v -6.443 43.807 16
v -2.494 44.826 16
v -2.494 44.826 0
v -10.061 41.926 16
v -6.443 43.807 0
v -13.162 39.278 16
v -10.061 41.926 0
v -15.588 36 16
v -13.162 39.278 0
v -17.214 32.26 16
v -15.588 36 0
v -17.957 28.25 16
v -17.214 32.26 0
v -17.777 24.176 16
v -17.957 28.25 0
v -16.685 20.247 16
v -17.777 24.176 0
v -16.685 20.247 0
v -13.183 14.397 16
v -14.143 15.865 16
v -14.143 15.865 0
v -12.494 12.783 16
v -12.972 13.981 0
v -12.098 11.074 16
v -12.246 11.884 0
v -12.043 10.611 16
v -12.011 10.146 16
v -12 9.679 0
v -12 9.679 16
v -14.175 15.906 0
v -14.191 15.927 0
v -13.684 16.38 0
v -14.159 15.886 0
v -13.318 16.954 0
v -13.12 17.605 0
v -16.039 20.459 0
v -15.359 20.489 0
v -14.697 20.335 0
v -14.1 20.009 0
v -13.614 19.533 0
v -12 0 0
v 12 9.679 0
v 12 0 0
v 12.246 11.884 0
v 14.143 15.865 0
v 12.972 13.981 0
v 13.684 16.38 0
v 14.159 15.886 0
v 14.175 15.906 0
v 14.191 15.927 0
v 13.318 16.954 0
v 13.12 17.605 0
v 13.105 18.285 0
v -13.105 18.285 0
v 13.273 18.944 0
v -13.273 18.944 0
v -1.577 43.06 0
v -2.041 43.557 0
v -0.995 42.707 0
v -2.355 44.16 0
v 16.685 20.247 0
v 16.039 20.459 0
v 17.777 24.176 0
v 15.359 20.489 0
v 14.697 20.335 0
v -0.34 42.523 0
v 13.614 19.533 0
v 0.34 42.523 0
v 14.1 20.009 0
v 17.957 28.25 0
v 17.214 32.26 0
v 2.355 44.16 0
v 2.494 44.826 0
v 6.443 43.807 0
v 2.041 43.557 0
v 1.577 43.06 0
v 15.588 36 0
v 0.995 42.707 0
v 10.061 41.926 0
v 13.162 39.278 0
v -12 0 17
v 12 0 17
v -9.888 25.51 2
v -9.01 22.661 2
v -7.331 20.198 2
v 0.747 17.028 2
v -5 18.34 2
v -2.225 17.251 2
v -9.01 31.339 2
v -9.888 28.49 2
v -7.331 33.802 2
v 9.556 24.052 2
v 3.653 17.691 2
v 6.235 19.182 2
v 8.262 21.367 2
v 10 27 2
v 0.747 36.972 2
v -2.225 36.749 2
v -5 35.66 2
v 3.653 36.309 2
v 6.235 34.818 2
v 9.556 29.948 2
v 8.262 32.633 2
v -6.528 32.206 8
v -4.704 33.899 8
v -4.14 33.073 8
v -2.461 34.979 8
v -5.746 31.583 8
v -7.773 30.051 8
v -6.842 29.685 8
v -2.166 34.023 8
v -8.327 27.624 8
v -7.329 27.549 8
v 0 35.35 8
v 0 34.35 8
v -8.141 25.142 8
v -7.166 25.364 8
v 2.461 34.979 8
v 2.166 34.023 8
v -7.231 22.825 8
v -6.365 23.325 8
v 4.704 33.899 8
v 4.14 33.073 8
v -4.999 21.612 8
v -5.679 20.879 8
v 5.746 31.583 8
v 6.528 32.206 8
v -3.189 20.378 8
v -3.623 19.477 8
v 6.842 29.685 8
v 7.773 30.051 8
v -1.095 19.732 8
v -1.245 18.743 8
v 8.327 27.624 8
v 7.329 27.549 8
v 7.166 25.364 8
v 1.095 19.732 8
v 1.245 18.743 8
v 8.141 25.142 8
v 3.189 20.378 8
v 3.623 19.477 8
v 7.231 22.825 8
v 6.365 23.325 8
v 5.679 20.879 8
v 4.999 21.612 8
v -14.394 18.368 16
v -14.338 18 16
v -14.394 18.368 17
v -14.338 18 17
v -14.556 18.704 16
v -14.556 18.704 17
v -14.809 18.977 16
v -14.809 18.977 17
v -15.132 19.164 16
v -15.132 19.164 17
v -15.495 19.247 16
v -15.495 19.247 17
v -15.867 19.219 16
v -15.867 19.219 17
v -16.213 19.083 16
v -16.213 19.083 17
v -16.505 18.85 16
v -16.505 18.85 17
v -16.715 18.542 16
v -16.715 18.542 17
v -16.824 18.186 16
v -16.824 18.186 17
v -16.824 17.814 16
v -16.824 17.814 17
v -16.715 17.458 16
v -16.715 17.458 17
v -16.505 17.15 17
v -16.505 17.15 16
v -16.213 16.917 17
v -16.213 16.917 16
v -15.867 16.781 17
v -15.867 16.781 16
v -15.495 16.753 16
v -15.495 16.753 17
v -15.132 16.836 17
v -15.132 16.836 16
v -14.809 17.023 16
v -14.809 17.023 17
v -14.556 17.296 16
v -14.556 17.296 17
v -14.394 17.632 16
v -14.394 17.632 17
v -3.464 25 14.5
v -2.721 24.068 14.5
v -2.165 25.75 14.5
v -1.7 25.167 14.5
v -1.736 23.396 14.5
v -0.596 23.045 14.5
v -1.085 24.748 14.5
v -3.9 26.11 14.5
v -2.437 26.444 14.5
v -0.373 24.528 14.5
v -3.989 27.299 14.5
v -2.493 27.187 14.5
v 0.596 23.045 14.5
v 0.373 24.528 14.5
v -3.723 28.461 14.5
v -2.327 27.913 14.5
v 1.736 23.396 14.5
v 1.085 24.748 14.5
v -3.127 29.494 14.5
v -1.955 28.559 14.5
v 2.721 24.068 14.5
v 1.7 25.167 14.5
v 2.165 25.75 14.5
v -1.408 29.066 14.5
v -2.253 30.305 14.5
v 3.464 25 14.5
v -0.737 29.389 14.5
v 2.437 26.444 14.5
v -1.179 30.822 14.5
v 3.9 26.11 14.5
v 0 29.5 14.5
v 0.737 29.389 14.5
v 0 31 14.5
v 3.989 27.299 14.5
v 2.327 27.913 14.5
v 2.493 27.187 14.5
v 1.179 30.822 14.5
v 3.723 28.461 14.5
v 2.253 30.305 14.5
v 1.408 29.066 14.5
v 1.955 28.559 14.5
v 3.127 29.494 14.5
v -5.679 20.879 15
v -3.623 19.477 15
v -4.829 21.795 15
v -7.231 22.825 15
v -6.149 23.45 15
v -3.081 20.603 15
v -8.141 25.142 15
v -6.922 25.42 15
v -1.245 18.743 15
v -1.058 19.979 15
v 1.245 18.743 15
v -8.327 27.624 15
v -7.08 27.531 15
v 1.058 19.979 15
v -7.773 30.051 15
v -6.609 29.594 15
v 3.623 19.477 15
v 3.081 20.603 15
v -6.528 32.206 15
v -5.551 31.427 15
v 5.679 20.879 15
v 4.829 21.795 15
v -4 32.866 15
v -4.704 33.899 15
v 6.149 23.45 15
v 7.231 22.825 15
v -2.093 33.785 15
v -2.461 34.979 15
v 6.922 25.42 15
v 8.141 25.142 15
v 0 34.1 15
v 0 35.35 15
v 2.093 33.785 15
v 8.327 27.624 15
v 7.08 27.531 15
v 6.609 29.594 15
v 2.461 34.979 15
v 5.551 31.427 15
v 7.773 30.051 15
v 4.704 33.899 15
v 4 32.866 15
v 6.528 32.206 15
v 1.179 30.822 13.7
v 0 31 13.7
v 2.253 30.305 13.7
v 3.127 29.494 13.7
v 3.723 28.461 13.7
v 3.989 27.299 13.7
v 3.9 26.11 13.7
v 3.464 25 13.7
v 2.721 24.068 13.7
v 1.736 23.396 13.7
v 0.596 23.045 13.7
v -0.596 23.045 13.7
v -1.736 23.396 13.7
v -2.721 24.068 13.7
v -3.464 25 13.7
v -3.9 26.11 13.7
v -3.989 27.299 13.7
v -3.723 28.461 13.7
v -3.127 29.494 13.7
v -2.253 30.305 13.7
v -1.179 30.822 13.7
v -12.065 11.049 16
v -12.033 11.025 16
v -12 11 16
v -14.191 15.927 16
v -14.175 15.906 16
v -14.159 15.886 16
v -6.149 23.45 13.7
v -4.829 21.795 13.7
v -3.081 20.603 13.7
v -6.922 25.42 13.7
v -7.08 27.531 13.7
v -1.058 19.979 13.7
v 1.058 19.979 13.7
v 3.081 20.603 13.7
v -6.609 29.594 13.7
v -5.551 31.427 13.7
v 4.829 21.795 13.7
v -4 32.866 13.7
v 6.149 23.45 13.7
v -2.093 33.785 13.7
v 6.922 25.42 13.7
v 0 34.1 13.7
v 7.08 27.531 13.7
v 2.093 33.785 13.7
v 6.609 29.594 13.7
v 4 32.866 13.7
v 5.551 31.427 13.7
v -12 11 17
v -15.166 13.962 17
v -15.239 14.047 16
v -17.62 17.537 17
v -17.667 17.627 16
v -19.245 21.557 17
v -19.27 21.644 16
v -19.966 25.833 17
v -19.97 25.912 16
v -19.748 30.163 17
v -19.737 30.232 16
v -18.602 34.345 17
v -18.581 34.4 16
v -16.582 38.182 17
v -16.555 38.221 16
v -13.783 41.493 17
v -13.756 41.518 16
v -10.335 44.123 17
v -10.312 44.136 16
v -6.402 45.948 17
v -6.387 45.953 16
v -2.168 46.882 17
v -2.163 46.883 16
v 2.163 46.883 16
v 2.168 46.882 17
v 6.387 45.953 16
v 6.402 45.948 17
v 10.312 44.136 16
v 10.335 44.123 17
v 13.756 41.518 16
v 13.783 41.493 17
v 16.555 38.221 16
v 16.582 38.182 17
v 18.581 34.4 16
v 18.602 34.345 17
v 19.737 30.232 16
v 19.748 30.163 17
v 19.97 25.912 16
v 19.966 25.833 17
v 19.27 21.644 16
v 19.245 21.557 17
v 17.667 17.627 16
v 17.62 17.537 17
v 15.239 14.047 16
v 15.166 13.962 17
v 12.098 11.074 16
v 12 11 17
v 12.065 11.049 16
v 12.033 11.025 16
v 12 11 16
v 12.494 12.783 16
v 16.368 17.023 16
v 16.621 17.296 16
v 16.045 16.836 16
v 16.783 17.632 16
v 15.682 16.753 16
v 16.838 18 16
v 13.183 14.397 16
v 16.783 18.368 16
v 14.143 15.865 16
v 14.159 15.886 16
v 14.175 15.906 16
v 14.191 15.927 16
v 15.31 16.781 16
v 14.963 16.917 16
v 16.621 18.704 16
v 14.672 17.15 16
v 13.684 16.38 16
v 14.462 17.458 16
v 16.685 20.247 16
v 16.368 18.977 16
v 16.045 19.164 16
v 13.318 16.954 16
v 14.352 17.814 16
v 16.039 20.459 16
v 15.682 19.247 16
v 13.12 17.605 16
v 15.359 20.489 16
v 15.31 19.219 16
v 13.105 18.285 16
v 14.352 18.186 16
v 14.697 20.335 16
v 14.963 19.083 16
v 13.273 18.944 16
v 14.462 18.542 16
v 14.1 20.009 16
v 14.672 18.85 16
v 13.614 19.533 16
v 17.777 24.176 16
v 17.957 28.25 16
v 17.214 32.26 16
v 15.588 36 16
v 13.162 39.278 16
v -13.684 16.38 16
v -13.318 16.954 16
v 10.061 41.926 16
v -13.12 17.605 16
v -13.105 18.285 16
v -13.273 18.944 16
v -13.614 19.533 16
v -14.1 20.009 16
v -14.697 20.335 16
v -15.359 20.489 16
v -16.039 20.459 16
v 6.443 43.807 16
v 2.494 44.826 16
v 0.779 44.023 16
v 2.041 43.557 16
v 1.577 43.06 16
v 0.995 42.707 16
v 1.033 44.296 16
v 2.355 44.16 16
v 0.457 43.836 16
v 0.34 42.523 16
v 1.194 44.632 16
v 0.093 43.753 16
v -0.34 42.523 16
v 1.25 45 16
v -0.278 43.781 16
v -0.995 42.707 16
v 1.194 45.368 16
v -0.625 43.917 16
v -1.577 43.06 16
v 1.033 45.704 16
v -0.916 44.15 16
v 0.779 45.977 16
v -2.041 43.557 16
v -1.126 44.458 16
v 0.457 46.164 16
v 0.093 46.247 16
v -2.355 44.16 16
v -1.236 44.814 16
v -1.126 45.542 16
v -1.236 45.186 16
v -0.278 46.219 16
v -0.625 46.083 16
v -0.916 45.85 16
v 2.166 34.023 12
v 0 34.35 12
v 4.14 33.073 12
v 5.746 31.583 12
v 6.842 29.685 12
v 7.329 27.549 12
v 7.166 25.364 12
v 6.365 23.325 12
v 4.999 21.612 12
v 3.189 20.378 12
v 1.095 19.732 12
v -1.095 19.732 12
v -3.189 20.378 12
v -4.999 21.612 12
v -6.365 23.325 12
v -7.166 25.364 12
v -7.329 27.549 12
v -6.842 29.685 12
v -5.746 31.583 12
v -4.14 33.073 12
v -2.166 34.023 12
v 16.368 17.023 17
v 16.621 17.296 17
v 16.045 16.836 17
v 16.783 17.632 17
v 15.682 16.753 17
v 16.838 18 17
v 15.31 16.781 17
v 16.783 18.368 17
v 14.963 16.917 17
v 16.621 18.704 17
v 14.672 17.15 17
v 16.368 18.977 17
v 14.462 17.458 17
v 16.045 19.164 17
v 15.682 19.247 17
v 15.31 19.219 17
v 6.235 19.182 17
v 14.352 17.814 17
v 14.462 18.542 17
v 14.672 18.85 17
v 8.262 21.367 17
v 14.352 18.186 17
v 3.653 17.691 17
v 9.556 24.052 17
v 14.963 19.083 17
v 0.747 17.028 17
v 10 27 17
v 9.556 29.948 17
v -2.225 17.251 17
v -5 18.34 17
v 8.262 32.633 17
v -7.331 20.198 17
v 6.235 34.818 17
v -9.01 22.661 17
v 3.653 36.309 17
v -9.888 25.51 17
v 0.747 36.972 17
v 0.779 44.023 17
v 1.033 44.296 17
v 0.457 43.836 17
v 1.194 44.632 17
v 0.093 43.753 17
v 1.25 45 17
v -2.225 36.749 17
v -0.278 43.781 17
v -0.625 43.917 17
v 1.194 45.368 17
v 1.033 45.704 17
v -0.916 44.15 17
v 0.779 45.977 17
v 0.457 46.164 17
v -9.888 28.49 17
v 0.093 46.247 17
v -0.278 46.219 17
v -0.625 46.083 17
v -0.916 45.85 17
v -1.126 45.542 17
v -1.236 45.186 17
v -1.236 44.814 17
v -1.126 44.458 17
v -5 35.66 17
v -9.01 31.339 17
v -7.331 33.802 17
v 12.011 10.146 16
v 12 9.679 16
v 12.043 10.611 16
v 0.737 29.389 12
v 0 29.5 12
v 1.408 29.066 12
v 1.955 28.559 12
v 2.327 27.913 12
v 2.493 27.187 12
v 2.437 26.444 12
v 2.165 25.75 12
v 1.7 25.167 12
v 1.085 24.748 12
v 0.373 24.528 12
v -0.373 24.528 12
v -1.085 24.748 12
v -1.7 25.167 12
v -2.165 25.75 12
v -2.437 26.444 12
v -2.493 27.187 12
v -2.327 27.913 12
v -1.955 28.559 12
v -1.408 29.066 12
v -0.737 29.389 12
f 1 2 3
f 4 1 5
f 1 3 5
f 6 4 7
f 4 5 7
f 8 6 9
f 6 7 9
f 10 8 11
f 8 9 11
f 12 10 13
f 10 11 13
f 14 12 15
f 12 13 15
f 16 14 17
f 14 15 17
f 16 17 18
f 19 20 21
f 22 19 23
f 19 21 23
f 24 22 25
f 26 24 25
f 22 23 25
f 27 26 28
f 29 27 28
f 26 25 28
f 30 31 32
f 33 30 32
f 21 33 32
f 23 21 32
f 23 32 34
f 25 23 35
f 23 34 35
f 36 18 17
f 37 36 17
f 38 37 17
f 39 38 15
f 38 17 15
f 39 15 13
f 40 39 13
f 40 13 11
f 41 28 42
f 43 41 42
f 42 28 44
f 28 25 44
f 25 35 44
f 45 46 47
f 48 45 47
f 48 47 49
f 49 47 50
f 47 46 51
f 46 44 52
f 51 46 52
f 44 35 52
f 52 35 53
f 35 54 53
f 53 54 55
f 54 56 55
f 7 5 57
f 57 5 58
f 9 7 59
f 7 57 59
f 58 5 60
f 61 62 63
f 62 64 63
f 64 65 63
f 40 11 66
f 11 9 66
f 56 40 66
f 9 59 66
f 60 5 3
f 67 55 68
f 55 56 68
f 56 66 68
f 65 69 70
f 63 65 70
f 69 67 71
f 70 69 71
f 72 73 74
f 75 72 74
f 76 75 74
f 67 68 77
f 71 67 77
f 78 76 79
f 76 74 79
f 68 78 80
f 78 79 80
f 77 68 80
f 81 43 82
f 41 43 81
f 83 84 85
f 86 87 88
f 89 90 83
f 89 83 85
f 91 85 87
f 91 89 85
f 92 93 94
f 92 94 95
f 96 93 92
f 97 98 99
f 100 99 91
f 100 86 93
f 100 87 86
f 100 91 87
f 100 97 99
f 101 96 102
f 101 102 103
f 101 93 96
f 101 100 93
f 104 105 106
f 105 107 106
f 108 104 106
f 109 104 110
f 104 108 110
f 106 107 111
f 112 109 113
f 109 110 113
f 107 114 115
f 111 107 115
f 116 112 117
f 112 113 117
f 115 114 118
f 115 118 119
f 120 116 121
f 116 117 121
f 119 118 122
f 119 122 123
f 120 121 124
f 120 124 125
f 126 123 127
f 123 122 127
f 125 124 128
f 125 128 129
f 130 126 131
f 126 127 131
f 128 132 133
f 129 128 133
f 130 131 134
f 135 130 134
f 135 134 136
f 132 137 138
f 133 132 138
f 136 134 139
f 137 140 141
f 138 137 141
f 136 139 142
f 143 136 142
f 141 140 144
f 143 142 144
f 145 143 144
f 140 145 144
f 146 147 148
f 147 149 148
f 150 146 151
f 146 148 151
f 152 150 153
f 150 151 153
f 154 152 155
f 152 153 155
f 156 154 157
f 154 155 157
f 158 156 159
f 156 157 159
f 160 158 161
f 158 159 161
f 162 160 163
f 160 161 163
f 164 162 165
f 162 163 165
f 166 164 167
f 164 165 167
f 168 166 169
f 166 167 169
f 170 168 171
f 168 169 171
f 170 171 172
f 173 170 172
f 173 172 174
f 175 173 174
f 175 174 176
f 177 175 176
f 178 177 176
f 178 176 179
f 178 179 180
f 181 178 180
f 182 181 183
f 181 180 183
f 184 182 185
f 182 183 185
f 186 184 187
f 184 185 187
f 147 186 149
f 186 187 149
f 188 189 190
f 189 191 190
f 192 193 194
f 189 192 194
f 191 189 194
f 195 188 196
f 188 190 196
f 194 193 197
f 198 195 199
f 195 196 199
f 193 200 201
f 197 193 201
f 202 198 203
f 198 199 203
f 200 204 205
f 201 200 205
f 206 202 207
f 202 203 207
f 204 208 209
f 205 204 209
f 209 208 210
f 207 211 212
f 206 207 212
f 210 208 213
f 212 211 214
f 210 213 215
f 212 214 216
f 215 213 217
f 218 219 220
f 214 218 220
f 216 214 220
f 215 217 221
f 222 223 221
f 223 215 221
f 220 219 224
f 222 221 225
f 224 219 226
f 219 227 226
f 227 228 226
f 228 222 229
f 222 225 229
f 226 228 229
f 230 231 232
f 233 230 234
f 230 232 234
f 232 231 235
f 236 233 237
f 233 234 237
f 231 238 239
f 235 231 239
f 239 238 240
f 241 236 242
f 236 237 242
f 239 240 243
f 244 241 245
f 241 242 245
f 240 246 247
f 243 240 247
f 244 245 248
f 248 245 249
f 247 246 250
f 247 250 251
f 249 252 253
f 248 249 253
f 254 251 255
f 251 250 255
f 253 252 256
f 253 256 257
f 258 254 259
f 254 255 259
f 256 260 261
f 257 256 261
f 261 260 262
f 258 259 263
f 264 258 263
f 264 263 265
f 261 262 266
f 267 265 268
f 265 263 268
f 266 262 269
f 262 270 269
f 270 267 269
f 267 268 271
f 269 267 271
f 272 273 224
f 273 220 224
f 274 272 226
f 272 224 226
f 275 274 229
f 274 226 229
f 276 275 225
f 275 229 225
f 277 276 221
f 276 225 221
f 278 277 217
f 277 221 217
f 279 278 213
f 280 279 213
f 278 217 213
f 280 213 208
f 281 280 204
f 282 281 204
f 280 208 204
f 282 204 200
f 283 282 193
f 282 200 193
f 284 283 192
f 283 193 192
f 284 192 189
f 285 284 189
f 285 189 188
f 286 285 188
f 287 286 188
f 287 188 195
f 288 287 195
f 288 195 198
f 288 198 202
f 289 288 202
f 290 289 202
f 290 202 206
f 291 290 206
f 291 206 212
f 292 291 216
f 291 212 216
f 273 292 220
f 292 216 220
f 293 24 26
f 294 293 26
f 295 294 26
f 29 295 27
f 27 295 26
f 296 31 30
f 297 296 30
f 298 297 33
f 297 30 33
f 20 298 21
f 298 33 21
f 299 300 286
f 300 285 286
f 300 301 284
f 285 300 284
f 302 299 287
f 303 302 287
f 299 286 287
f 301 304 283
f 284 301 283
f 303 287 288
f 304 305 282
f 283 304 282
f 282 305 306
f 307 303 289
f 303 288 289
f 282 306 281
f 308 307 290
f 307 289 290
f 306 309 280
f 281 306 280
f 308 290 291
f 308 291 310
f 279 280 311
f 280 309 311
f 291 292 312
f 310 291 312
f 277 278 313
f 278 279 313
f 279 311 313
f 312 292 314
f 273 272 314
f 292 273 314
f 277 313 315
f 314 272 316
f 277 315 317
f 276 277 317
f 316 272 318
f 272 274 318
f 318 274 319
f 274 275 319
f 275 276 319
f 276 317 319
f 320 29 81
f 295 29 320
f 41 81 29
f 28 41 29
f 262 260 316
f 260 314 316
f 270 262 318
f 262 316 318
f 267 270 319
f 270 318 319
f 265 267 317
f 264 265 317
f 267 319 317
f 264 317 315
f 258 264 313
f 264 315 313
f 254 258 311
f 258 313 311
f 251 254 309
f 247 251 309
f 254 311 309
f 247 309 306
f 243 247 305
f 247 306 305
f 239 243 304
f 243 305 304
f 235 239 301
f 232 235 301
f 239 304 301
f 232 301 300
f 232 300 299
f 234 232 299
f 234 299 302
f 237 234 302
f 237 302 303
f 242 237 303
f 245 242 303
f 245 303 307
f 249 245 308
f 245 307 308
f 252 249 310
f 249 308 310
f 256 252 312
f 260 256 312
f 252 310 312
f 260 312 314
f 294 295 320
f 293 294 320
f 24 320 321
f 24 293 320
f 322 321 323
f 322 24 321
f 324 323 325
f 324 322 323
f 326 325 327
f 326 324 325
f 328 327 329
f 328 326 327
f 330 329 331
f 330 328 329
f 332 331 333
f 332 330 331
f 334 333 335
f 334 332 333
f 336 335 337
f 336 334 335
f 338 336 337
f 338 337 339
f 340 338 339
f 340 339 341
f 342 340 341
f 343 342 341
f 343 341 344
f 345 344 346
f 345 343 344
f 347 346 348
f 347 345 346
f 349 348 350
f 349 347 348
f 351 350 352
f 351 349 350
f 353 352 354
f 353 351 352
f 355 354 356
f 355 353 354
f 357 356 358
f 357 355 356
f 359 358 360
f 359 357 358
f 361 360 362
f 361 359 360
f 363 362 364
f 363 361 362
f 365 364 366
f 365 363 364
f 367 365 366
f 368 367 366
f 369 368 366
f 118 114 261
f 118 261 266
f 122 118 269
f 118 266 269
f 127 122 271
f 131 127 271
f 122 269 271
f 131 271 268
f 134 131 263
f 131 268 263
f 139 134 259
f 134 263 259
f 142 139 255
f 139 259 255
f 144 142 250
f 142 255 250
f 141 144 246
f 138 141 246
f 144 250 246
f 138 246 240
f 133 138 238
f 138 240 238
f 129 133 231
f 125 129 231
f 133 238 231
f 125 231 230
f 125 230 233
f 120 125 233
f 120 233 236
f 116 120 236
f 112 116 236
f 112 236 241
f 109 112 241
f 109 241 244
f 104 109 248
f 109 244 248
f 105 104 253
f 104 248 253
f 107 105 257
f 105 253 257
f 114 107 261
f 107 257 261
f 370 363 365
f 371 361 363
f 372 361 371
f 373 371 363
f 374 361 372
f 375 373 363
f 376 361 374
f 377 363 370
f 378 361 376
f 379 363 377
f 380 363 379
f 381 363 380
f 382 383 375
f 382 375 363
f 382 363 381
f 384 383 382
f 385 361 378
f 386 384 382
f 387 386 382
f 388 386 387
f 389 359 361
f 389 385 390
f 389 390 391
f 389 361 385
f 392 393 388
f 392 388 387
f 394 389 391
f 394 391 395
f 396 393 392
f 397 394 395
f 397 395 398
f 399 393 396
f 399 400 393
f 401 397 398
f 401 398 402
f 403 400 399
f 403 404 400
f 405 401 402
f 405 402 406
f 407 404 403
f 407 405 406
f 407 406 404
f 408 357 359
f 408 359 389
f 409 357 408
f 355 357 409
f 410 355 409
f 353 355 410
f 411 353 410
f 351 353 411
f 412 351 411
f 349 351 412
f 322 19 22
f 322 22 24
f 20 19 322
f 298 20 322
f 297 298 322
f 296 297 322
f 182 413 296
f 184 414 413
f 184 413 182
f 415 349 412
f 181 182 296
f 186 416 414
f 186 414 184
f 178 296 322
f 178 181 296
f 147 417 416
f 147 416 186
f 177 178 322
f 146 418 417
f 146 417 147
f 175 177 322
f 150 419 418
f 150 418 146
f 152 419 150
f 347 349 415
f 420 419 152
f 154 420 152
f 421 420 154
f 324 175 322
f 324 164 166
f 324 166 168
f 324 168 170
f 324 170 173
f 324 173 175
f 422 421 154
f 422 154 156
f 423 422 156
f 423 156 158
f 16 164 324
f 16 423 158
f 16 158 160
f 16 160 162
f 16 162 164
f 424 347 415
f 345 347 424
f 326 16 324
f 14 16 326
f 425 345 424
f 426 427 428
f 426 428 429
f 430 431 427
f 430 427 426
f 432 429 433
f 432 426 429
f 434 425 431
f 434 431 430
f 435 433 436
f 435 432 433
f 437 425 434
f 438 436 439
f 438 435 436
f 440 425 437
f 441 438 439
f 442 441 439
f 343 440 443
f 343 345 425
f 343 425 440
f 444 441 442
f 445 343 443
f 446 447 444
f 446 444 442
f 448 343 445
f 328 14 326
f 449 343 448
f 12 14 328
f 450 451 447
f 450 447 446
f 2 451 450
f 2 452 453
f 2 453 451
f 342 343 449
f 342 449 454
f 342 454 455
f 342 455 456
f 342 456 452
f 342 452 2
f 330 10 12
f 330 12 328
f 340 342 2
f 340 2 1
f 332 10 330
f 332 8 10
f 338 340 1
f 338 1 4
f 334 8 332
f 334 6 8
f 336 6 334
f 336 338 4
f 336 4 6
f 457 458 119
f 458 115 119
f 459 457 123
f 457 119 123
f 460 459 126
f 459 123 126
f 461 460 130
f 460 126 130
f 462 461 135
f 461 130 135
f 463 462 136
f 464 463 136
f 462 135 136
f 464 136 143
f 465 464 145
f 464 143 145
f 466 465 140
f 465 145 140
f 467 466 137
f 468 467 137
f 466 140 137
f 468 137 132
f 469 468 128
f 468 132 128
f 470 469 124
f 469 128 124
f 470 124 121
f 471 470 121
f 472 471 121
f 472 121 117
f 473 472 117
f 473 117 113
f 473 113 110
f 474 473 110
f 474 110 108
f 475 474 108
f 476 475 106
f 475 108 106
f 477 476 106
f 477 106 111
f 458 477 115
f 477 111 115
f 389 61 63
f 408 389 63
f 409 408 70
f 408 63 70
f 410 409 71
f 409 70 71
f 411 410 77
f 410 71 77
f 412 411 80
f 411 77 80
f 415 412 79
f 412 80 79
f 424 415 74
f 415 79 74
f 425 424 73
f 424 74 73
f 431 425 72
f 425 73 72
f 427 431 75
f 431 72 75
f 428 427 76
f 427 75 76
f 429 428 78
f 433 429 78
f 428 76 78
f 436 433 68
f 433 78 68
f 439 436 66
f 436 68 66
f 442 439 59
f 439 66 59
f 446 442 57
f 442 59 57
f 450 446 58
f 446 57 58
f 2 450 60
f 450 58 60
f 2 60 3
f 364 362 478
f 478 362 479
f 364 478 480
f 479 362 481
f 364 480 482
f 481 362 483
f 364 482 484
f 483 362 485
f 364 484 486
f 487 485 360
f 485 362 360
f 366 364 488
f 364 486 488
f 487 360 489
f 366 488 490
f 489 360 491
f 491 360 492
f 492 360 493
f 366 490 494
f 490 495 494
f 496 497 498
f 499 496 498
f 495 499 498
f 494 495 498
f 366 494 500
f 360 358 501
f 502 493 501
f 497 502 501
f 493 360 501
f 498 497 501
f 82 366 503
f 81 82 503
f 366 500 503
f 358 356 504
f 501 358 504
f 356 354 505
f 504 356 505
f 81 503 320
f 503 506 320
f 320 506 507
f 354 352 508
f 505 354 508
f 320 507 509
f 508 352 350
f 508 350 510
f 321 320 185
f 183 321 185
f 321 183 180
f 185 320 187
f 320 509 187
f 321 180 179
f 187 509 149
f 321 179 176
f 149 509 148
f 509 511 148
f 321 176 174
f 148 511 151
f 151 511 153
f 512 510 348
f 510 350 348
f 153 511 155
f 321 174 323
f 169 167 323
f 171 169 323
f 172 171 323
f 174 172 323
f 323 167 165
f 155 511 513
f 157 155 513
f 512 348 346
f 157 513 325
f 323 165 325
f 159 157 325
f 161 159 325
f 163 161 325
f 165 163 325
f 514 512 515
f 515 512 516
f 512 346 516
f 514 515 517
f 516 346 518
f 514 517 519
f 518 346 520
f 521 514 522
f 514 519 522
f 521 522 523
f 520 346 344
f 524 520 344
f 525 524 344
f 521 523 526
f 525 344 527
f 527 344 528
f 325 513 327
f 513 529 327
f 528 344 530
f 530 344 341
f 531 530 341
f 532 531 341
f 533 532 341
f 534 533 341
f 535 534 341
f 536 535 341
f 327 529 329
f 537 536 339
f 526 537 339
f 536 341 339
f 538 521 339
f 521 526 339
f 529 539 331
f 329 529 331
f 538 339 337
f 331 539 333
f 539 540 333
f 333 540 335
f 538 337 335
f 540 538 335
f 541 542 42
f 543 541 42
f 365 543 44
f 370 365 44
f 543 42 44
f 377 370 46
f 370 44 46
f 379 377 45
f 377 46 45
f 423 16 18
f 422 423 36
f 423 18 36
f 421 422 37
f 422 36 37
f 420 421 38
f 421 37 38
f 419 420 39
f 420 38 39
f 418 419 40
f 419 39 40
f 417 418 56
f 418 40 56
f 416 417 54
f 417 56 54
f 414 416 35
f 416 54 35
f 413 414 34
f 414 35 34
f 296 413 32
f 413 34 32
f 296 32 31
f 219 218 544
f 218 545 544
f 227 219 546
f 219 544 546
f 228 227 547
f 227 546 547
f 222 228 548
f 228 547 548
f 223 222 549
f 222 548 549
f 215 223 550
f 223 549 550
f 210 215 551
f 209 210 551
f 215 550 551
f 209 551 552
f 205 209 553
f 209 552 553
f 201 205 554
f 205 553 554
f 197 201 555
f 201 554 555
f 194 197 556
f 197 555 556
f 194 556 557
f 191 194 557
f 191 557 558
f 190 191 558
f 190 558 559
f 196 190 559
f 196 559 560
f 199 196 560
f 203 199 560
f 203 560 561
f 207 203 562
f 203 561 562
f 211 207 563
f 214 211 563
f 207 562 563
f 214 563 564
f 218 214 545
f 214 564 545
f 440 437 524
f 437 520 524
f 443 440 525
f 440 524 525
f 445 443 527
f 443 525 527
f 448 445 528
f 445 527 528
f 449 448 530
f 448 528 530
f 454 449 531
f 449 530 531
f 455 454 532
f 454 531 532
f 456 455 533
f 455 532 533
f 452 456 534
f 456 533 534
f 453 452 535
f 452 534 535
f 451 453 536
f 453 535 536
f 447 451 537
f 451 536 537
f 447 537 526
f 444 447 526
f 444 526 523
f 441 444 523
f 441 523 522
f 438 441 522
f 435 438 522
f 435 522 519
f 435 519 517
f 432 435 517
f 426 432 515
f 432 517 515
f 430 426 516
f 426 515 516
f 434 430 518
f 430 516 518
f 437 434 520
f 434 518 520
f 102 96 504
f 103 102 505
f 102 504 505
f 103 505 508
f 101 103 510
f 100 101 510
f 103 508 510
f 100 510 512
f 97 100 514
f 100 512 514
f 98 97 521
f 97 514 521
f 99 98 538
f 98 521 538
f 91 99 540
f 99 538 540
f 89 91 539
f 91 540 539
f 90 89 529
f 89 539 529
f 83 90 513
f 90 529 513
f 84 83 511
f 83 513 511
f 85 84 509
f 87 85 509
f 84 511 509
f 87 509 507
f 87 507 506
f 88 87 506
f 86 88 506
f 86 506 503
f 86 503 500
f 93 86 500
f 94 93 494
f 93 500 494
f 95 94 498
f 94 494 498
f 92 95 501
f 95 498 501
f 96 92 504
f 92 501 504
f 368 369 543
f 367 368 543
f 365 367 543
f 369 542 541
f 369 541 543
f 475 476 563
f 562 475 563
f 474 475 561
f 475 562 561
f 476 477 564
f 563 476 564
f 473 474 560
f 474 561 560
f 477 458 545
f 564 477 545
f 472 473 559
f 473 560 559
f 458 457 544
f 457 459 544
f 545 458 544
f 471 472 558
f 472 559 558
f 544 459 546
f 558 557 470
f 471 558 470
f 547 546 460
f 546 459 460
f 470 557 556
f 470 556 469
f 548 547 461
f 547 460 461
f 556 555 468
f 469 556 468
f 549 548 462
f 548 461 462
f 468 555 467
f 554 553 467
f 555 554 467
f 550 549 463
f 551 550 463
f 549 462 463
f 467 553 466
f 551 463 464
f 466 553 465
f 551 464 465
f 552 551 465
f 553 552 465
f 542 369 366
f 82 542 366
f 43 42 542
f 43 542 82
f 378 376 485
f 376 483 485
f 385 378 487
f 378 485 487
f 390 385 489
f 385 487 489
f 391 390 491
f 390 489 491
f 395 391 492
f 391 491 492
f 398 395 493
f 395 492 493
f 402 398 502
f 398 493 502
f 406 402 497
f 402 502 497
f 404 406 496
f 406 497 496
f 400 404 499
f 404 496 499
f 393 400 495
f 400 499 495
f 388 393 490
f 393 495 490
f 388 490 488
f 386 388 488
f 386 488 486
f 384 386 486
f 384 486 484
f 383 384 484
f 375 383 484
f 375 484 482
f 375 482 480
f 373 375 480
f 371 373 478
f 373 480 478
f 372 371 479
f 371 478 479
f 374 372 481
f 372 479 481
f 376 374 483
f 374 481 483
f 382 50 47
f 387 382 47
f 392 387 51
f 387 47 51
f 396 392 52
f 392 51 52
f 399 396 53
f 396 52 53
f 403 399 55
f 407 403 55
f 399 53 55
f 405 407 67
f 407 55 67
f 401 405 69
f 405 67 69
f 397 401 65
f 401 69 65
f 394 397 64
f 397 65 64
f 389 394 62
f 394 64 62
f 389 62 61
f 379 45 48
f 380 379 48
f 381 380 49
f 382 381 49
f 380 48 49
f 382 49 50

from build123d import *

# Parameters (mm, degrees)
EXTRUDE1_DEPTH                   = 16
EXTRUDE2_DEPTH                   = 1
CBORE_FOR_M2_5_SHCS1_D           = 2.5
CBORE_FOR_M2_5_SHCS1_CBORE_D     = 5
CBORE_FOR_M2_5_SHCS1_CBORE_DEPTH = 16
SKETCH6_R                        = 10
CUT_EXTRUDE1_DEPTH               = 15


with BuildPart() as part:
    # Sketch1 → Extrude1 (new body)
    with BuildSketch(Plane.XY):
        with BuildLine():
            Line((-12, 0), (12, 0))
            Line((12, 0), (12, 9.679491924))
            ThreePointArc((12, 9.679491924), (12.550888175, 12.952760278), (14.142857143, 15.865387666))
            ThreePointArc((14.142857143, 15.865387666), (0, 45), (-14.142857143, 15.865387666))
            ThreePointArc((-14.142857143, 15.865387666), (-12.550888175, 12.952760278), (-12, 9.679491924))
            Line((-12, 9.679491924), (-12, 0))
        make_face()
    extrude(amount=EXTRUDE1_DEPTH)

    # Sketch2 → Extrude2 (add)
    with BuildSketch(Plane.XY.offset(16)):
        with BuildLine():
            Line((12, 11), (12, 0))
            Line((12, 0), (-12, 0))
            Line((-12, 0), (-12, 11))
            ThreePointArc((-12, 11), (0, 47), (12, 11))
        make_face()
    extrude(amount=EXTRUDE2_DEPTH)

    # CBORE for M2.5 SHCS1 (through all)
    with Locations(Plane(origin=(0, 0, 0), x_dir=(-1, 0, 0), z_dir=(0, 0, -1))):
        with Locations((0, 45), (15.588457268, 18), (-15.588457268, 18)):
            CounterBoreHole(CBORE_FOR_M2_5_SHCS1_D / 2, CBORE_FOR_M2_5_SHCS1_CBORE_D / 2, CBORE_FOR_M2_5_SHCS1_CBORE_DEPTH)

    # Sketch6 → Cut-Extrude1 (cut)
    with BuildSketch(Plane.XY.offset(17)):
        with Locations((0, 27)):
            Circle(SKETCH6_R)
    extrude(amount=-CUT_EXTRUDE1_DEPTH, mode=Mode.SUBTRACT)


with BuildPart() as body_2:
    # Sketch7 → Revolve1 (revolve)
    with BuildSketch(Plane(origin=(0, 0, 0), x_dir=(0, 0, -1), z_dir=(1, 0, 0))):
        Polygon((-8, 34.35), (-8, 35.35), (-15, 35.35), (-15, 34.1), (-13.7, 34.1), (-13.7, 31), (-14.5, 31), (-14.5, 29.5), (-12, 29.5), (-12, 34.35), align=None)
    revolve(axis=Axis((0, 27, 16), (0, 0, -1)))


solid = Compound([part.part, body_2.part])
